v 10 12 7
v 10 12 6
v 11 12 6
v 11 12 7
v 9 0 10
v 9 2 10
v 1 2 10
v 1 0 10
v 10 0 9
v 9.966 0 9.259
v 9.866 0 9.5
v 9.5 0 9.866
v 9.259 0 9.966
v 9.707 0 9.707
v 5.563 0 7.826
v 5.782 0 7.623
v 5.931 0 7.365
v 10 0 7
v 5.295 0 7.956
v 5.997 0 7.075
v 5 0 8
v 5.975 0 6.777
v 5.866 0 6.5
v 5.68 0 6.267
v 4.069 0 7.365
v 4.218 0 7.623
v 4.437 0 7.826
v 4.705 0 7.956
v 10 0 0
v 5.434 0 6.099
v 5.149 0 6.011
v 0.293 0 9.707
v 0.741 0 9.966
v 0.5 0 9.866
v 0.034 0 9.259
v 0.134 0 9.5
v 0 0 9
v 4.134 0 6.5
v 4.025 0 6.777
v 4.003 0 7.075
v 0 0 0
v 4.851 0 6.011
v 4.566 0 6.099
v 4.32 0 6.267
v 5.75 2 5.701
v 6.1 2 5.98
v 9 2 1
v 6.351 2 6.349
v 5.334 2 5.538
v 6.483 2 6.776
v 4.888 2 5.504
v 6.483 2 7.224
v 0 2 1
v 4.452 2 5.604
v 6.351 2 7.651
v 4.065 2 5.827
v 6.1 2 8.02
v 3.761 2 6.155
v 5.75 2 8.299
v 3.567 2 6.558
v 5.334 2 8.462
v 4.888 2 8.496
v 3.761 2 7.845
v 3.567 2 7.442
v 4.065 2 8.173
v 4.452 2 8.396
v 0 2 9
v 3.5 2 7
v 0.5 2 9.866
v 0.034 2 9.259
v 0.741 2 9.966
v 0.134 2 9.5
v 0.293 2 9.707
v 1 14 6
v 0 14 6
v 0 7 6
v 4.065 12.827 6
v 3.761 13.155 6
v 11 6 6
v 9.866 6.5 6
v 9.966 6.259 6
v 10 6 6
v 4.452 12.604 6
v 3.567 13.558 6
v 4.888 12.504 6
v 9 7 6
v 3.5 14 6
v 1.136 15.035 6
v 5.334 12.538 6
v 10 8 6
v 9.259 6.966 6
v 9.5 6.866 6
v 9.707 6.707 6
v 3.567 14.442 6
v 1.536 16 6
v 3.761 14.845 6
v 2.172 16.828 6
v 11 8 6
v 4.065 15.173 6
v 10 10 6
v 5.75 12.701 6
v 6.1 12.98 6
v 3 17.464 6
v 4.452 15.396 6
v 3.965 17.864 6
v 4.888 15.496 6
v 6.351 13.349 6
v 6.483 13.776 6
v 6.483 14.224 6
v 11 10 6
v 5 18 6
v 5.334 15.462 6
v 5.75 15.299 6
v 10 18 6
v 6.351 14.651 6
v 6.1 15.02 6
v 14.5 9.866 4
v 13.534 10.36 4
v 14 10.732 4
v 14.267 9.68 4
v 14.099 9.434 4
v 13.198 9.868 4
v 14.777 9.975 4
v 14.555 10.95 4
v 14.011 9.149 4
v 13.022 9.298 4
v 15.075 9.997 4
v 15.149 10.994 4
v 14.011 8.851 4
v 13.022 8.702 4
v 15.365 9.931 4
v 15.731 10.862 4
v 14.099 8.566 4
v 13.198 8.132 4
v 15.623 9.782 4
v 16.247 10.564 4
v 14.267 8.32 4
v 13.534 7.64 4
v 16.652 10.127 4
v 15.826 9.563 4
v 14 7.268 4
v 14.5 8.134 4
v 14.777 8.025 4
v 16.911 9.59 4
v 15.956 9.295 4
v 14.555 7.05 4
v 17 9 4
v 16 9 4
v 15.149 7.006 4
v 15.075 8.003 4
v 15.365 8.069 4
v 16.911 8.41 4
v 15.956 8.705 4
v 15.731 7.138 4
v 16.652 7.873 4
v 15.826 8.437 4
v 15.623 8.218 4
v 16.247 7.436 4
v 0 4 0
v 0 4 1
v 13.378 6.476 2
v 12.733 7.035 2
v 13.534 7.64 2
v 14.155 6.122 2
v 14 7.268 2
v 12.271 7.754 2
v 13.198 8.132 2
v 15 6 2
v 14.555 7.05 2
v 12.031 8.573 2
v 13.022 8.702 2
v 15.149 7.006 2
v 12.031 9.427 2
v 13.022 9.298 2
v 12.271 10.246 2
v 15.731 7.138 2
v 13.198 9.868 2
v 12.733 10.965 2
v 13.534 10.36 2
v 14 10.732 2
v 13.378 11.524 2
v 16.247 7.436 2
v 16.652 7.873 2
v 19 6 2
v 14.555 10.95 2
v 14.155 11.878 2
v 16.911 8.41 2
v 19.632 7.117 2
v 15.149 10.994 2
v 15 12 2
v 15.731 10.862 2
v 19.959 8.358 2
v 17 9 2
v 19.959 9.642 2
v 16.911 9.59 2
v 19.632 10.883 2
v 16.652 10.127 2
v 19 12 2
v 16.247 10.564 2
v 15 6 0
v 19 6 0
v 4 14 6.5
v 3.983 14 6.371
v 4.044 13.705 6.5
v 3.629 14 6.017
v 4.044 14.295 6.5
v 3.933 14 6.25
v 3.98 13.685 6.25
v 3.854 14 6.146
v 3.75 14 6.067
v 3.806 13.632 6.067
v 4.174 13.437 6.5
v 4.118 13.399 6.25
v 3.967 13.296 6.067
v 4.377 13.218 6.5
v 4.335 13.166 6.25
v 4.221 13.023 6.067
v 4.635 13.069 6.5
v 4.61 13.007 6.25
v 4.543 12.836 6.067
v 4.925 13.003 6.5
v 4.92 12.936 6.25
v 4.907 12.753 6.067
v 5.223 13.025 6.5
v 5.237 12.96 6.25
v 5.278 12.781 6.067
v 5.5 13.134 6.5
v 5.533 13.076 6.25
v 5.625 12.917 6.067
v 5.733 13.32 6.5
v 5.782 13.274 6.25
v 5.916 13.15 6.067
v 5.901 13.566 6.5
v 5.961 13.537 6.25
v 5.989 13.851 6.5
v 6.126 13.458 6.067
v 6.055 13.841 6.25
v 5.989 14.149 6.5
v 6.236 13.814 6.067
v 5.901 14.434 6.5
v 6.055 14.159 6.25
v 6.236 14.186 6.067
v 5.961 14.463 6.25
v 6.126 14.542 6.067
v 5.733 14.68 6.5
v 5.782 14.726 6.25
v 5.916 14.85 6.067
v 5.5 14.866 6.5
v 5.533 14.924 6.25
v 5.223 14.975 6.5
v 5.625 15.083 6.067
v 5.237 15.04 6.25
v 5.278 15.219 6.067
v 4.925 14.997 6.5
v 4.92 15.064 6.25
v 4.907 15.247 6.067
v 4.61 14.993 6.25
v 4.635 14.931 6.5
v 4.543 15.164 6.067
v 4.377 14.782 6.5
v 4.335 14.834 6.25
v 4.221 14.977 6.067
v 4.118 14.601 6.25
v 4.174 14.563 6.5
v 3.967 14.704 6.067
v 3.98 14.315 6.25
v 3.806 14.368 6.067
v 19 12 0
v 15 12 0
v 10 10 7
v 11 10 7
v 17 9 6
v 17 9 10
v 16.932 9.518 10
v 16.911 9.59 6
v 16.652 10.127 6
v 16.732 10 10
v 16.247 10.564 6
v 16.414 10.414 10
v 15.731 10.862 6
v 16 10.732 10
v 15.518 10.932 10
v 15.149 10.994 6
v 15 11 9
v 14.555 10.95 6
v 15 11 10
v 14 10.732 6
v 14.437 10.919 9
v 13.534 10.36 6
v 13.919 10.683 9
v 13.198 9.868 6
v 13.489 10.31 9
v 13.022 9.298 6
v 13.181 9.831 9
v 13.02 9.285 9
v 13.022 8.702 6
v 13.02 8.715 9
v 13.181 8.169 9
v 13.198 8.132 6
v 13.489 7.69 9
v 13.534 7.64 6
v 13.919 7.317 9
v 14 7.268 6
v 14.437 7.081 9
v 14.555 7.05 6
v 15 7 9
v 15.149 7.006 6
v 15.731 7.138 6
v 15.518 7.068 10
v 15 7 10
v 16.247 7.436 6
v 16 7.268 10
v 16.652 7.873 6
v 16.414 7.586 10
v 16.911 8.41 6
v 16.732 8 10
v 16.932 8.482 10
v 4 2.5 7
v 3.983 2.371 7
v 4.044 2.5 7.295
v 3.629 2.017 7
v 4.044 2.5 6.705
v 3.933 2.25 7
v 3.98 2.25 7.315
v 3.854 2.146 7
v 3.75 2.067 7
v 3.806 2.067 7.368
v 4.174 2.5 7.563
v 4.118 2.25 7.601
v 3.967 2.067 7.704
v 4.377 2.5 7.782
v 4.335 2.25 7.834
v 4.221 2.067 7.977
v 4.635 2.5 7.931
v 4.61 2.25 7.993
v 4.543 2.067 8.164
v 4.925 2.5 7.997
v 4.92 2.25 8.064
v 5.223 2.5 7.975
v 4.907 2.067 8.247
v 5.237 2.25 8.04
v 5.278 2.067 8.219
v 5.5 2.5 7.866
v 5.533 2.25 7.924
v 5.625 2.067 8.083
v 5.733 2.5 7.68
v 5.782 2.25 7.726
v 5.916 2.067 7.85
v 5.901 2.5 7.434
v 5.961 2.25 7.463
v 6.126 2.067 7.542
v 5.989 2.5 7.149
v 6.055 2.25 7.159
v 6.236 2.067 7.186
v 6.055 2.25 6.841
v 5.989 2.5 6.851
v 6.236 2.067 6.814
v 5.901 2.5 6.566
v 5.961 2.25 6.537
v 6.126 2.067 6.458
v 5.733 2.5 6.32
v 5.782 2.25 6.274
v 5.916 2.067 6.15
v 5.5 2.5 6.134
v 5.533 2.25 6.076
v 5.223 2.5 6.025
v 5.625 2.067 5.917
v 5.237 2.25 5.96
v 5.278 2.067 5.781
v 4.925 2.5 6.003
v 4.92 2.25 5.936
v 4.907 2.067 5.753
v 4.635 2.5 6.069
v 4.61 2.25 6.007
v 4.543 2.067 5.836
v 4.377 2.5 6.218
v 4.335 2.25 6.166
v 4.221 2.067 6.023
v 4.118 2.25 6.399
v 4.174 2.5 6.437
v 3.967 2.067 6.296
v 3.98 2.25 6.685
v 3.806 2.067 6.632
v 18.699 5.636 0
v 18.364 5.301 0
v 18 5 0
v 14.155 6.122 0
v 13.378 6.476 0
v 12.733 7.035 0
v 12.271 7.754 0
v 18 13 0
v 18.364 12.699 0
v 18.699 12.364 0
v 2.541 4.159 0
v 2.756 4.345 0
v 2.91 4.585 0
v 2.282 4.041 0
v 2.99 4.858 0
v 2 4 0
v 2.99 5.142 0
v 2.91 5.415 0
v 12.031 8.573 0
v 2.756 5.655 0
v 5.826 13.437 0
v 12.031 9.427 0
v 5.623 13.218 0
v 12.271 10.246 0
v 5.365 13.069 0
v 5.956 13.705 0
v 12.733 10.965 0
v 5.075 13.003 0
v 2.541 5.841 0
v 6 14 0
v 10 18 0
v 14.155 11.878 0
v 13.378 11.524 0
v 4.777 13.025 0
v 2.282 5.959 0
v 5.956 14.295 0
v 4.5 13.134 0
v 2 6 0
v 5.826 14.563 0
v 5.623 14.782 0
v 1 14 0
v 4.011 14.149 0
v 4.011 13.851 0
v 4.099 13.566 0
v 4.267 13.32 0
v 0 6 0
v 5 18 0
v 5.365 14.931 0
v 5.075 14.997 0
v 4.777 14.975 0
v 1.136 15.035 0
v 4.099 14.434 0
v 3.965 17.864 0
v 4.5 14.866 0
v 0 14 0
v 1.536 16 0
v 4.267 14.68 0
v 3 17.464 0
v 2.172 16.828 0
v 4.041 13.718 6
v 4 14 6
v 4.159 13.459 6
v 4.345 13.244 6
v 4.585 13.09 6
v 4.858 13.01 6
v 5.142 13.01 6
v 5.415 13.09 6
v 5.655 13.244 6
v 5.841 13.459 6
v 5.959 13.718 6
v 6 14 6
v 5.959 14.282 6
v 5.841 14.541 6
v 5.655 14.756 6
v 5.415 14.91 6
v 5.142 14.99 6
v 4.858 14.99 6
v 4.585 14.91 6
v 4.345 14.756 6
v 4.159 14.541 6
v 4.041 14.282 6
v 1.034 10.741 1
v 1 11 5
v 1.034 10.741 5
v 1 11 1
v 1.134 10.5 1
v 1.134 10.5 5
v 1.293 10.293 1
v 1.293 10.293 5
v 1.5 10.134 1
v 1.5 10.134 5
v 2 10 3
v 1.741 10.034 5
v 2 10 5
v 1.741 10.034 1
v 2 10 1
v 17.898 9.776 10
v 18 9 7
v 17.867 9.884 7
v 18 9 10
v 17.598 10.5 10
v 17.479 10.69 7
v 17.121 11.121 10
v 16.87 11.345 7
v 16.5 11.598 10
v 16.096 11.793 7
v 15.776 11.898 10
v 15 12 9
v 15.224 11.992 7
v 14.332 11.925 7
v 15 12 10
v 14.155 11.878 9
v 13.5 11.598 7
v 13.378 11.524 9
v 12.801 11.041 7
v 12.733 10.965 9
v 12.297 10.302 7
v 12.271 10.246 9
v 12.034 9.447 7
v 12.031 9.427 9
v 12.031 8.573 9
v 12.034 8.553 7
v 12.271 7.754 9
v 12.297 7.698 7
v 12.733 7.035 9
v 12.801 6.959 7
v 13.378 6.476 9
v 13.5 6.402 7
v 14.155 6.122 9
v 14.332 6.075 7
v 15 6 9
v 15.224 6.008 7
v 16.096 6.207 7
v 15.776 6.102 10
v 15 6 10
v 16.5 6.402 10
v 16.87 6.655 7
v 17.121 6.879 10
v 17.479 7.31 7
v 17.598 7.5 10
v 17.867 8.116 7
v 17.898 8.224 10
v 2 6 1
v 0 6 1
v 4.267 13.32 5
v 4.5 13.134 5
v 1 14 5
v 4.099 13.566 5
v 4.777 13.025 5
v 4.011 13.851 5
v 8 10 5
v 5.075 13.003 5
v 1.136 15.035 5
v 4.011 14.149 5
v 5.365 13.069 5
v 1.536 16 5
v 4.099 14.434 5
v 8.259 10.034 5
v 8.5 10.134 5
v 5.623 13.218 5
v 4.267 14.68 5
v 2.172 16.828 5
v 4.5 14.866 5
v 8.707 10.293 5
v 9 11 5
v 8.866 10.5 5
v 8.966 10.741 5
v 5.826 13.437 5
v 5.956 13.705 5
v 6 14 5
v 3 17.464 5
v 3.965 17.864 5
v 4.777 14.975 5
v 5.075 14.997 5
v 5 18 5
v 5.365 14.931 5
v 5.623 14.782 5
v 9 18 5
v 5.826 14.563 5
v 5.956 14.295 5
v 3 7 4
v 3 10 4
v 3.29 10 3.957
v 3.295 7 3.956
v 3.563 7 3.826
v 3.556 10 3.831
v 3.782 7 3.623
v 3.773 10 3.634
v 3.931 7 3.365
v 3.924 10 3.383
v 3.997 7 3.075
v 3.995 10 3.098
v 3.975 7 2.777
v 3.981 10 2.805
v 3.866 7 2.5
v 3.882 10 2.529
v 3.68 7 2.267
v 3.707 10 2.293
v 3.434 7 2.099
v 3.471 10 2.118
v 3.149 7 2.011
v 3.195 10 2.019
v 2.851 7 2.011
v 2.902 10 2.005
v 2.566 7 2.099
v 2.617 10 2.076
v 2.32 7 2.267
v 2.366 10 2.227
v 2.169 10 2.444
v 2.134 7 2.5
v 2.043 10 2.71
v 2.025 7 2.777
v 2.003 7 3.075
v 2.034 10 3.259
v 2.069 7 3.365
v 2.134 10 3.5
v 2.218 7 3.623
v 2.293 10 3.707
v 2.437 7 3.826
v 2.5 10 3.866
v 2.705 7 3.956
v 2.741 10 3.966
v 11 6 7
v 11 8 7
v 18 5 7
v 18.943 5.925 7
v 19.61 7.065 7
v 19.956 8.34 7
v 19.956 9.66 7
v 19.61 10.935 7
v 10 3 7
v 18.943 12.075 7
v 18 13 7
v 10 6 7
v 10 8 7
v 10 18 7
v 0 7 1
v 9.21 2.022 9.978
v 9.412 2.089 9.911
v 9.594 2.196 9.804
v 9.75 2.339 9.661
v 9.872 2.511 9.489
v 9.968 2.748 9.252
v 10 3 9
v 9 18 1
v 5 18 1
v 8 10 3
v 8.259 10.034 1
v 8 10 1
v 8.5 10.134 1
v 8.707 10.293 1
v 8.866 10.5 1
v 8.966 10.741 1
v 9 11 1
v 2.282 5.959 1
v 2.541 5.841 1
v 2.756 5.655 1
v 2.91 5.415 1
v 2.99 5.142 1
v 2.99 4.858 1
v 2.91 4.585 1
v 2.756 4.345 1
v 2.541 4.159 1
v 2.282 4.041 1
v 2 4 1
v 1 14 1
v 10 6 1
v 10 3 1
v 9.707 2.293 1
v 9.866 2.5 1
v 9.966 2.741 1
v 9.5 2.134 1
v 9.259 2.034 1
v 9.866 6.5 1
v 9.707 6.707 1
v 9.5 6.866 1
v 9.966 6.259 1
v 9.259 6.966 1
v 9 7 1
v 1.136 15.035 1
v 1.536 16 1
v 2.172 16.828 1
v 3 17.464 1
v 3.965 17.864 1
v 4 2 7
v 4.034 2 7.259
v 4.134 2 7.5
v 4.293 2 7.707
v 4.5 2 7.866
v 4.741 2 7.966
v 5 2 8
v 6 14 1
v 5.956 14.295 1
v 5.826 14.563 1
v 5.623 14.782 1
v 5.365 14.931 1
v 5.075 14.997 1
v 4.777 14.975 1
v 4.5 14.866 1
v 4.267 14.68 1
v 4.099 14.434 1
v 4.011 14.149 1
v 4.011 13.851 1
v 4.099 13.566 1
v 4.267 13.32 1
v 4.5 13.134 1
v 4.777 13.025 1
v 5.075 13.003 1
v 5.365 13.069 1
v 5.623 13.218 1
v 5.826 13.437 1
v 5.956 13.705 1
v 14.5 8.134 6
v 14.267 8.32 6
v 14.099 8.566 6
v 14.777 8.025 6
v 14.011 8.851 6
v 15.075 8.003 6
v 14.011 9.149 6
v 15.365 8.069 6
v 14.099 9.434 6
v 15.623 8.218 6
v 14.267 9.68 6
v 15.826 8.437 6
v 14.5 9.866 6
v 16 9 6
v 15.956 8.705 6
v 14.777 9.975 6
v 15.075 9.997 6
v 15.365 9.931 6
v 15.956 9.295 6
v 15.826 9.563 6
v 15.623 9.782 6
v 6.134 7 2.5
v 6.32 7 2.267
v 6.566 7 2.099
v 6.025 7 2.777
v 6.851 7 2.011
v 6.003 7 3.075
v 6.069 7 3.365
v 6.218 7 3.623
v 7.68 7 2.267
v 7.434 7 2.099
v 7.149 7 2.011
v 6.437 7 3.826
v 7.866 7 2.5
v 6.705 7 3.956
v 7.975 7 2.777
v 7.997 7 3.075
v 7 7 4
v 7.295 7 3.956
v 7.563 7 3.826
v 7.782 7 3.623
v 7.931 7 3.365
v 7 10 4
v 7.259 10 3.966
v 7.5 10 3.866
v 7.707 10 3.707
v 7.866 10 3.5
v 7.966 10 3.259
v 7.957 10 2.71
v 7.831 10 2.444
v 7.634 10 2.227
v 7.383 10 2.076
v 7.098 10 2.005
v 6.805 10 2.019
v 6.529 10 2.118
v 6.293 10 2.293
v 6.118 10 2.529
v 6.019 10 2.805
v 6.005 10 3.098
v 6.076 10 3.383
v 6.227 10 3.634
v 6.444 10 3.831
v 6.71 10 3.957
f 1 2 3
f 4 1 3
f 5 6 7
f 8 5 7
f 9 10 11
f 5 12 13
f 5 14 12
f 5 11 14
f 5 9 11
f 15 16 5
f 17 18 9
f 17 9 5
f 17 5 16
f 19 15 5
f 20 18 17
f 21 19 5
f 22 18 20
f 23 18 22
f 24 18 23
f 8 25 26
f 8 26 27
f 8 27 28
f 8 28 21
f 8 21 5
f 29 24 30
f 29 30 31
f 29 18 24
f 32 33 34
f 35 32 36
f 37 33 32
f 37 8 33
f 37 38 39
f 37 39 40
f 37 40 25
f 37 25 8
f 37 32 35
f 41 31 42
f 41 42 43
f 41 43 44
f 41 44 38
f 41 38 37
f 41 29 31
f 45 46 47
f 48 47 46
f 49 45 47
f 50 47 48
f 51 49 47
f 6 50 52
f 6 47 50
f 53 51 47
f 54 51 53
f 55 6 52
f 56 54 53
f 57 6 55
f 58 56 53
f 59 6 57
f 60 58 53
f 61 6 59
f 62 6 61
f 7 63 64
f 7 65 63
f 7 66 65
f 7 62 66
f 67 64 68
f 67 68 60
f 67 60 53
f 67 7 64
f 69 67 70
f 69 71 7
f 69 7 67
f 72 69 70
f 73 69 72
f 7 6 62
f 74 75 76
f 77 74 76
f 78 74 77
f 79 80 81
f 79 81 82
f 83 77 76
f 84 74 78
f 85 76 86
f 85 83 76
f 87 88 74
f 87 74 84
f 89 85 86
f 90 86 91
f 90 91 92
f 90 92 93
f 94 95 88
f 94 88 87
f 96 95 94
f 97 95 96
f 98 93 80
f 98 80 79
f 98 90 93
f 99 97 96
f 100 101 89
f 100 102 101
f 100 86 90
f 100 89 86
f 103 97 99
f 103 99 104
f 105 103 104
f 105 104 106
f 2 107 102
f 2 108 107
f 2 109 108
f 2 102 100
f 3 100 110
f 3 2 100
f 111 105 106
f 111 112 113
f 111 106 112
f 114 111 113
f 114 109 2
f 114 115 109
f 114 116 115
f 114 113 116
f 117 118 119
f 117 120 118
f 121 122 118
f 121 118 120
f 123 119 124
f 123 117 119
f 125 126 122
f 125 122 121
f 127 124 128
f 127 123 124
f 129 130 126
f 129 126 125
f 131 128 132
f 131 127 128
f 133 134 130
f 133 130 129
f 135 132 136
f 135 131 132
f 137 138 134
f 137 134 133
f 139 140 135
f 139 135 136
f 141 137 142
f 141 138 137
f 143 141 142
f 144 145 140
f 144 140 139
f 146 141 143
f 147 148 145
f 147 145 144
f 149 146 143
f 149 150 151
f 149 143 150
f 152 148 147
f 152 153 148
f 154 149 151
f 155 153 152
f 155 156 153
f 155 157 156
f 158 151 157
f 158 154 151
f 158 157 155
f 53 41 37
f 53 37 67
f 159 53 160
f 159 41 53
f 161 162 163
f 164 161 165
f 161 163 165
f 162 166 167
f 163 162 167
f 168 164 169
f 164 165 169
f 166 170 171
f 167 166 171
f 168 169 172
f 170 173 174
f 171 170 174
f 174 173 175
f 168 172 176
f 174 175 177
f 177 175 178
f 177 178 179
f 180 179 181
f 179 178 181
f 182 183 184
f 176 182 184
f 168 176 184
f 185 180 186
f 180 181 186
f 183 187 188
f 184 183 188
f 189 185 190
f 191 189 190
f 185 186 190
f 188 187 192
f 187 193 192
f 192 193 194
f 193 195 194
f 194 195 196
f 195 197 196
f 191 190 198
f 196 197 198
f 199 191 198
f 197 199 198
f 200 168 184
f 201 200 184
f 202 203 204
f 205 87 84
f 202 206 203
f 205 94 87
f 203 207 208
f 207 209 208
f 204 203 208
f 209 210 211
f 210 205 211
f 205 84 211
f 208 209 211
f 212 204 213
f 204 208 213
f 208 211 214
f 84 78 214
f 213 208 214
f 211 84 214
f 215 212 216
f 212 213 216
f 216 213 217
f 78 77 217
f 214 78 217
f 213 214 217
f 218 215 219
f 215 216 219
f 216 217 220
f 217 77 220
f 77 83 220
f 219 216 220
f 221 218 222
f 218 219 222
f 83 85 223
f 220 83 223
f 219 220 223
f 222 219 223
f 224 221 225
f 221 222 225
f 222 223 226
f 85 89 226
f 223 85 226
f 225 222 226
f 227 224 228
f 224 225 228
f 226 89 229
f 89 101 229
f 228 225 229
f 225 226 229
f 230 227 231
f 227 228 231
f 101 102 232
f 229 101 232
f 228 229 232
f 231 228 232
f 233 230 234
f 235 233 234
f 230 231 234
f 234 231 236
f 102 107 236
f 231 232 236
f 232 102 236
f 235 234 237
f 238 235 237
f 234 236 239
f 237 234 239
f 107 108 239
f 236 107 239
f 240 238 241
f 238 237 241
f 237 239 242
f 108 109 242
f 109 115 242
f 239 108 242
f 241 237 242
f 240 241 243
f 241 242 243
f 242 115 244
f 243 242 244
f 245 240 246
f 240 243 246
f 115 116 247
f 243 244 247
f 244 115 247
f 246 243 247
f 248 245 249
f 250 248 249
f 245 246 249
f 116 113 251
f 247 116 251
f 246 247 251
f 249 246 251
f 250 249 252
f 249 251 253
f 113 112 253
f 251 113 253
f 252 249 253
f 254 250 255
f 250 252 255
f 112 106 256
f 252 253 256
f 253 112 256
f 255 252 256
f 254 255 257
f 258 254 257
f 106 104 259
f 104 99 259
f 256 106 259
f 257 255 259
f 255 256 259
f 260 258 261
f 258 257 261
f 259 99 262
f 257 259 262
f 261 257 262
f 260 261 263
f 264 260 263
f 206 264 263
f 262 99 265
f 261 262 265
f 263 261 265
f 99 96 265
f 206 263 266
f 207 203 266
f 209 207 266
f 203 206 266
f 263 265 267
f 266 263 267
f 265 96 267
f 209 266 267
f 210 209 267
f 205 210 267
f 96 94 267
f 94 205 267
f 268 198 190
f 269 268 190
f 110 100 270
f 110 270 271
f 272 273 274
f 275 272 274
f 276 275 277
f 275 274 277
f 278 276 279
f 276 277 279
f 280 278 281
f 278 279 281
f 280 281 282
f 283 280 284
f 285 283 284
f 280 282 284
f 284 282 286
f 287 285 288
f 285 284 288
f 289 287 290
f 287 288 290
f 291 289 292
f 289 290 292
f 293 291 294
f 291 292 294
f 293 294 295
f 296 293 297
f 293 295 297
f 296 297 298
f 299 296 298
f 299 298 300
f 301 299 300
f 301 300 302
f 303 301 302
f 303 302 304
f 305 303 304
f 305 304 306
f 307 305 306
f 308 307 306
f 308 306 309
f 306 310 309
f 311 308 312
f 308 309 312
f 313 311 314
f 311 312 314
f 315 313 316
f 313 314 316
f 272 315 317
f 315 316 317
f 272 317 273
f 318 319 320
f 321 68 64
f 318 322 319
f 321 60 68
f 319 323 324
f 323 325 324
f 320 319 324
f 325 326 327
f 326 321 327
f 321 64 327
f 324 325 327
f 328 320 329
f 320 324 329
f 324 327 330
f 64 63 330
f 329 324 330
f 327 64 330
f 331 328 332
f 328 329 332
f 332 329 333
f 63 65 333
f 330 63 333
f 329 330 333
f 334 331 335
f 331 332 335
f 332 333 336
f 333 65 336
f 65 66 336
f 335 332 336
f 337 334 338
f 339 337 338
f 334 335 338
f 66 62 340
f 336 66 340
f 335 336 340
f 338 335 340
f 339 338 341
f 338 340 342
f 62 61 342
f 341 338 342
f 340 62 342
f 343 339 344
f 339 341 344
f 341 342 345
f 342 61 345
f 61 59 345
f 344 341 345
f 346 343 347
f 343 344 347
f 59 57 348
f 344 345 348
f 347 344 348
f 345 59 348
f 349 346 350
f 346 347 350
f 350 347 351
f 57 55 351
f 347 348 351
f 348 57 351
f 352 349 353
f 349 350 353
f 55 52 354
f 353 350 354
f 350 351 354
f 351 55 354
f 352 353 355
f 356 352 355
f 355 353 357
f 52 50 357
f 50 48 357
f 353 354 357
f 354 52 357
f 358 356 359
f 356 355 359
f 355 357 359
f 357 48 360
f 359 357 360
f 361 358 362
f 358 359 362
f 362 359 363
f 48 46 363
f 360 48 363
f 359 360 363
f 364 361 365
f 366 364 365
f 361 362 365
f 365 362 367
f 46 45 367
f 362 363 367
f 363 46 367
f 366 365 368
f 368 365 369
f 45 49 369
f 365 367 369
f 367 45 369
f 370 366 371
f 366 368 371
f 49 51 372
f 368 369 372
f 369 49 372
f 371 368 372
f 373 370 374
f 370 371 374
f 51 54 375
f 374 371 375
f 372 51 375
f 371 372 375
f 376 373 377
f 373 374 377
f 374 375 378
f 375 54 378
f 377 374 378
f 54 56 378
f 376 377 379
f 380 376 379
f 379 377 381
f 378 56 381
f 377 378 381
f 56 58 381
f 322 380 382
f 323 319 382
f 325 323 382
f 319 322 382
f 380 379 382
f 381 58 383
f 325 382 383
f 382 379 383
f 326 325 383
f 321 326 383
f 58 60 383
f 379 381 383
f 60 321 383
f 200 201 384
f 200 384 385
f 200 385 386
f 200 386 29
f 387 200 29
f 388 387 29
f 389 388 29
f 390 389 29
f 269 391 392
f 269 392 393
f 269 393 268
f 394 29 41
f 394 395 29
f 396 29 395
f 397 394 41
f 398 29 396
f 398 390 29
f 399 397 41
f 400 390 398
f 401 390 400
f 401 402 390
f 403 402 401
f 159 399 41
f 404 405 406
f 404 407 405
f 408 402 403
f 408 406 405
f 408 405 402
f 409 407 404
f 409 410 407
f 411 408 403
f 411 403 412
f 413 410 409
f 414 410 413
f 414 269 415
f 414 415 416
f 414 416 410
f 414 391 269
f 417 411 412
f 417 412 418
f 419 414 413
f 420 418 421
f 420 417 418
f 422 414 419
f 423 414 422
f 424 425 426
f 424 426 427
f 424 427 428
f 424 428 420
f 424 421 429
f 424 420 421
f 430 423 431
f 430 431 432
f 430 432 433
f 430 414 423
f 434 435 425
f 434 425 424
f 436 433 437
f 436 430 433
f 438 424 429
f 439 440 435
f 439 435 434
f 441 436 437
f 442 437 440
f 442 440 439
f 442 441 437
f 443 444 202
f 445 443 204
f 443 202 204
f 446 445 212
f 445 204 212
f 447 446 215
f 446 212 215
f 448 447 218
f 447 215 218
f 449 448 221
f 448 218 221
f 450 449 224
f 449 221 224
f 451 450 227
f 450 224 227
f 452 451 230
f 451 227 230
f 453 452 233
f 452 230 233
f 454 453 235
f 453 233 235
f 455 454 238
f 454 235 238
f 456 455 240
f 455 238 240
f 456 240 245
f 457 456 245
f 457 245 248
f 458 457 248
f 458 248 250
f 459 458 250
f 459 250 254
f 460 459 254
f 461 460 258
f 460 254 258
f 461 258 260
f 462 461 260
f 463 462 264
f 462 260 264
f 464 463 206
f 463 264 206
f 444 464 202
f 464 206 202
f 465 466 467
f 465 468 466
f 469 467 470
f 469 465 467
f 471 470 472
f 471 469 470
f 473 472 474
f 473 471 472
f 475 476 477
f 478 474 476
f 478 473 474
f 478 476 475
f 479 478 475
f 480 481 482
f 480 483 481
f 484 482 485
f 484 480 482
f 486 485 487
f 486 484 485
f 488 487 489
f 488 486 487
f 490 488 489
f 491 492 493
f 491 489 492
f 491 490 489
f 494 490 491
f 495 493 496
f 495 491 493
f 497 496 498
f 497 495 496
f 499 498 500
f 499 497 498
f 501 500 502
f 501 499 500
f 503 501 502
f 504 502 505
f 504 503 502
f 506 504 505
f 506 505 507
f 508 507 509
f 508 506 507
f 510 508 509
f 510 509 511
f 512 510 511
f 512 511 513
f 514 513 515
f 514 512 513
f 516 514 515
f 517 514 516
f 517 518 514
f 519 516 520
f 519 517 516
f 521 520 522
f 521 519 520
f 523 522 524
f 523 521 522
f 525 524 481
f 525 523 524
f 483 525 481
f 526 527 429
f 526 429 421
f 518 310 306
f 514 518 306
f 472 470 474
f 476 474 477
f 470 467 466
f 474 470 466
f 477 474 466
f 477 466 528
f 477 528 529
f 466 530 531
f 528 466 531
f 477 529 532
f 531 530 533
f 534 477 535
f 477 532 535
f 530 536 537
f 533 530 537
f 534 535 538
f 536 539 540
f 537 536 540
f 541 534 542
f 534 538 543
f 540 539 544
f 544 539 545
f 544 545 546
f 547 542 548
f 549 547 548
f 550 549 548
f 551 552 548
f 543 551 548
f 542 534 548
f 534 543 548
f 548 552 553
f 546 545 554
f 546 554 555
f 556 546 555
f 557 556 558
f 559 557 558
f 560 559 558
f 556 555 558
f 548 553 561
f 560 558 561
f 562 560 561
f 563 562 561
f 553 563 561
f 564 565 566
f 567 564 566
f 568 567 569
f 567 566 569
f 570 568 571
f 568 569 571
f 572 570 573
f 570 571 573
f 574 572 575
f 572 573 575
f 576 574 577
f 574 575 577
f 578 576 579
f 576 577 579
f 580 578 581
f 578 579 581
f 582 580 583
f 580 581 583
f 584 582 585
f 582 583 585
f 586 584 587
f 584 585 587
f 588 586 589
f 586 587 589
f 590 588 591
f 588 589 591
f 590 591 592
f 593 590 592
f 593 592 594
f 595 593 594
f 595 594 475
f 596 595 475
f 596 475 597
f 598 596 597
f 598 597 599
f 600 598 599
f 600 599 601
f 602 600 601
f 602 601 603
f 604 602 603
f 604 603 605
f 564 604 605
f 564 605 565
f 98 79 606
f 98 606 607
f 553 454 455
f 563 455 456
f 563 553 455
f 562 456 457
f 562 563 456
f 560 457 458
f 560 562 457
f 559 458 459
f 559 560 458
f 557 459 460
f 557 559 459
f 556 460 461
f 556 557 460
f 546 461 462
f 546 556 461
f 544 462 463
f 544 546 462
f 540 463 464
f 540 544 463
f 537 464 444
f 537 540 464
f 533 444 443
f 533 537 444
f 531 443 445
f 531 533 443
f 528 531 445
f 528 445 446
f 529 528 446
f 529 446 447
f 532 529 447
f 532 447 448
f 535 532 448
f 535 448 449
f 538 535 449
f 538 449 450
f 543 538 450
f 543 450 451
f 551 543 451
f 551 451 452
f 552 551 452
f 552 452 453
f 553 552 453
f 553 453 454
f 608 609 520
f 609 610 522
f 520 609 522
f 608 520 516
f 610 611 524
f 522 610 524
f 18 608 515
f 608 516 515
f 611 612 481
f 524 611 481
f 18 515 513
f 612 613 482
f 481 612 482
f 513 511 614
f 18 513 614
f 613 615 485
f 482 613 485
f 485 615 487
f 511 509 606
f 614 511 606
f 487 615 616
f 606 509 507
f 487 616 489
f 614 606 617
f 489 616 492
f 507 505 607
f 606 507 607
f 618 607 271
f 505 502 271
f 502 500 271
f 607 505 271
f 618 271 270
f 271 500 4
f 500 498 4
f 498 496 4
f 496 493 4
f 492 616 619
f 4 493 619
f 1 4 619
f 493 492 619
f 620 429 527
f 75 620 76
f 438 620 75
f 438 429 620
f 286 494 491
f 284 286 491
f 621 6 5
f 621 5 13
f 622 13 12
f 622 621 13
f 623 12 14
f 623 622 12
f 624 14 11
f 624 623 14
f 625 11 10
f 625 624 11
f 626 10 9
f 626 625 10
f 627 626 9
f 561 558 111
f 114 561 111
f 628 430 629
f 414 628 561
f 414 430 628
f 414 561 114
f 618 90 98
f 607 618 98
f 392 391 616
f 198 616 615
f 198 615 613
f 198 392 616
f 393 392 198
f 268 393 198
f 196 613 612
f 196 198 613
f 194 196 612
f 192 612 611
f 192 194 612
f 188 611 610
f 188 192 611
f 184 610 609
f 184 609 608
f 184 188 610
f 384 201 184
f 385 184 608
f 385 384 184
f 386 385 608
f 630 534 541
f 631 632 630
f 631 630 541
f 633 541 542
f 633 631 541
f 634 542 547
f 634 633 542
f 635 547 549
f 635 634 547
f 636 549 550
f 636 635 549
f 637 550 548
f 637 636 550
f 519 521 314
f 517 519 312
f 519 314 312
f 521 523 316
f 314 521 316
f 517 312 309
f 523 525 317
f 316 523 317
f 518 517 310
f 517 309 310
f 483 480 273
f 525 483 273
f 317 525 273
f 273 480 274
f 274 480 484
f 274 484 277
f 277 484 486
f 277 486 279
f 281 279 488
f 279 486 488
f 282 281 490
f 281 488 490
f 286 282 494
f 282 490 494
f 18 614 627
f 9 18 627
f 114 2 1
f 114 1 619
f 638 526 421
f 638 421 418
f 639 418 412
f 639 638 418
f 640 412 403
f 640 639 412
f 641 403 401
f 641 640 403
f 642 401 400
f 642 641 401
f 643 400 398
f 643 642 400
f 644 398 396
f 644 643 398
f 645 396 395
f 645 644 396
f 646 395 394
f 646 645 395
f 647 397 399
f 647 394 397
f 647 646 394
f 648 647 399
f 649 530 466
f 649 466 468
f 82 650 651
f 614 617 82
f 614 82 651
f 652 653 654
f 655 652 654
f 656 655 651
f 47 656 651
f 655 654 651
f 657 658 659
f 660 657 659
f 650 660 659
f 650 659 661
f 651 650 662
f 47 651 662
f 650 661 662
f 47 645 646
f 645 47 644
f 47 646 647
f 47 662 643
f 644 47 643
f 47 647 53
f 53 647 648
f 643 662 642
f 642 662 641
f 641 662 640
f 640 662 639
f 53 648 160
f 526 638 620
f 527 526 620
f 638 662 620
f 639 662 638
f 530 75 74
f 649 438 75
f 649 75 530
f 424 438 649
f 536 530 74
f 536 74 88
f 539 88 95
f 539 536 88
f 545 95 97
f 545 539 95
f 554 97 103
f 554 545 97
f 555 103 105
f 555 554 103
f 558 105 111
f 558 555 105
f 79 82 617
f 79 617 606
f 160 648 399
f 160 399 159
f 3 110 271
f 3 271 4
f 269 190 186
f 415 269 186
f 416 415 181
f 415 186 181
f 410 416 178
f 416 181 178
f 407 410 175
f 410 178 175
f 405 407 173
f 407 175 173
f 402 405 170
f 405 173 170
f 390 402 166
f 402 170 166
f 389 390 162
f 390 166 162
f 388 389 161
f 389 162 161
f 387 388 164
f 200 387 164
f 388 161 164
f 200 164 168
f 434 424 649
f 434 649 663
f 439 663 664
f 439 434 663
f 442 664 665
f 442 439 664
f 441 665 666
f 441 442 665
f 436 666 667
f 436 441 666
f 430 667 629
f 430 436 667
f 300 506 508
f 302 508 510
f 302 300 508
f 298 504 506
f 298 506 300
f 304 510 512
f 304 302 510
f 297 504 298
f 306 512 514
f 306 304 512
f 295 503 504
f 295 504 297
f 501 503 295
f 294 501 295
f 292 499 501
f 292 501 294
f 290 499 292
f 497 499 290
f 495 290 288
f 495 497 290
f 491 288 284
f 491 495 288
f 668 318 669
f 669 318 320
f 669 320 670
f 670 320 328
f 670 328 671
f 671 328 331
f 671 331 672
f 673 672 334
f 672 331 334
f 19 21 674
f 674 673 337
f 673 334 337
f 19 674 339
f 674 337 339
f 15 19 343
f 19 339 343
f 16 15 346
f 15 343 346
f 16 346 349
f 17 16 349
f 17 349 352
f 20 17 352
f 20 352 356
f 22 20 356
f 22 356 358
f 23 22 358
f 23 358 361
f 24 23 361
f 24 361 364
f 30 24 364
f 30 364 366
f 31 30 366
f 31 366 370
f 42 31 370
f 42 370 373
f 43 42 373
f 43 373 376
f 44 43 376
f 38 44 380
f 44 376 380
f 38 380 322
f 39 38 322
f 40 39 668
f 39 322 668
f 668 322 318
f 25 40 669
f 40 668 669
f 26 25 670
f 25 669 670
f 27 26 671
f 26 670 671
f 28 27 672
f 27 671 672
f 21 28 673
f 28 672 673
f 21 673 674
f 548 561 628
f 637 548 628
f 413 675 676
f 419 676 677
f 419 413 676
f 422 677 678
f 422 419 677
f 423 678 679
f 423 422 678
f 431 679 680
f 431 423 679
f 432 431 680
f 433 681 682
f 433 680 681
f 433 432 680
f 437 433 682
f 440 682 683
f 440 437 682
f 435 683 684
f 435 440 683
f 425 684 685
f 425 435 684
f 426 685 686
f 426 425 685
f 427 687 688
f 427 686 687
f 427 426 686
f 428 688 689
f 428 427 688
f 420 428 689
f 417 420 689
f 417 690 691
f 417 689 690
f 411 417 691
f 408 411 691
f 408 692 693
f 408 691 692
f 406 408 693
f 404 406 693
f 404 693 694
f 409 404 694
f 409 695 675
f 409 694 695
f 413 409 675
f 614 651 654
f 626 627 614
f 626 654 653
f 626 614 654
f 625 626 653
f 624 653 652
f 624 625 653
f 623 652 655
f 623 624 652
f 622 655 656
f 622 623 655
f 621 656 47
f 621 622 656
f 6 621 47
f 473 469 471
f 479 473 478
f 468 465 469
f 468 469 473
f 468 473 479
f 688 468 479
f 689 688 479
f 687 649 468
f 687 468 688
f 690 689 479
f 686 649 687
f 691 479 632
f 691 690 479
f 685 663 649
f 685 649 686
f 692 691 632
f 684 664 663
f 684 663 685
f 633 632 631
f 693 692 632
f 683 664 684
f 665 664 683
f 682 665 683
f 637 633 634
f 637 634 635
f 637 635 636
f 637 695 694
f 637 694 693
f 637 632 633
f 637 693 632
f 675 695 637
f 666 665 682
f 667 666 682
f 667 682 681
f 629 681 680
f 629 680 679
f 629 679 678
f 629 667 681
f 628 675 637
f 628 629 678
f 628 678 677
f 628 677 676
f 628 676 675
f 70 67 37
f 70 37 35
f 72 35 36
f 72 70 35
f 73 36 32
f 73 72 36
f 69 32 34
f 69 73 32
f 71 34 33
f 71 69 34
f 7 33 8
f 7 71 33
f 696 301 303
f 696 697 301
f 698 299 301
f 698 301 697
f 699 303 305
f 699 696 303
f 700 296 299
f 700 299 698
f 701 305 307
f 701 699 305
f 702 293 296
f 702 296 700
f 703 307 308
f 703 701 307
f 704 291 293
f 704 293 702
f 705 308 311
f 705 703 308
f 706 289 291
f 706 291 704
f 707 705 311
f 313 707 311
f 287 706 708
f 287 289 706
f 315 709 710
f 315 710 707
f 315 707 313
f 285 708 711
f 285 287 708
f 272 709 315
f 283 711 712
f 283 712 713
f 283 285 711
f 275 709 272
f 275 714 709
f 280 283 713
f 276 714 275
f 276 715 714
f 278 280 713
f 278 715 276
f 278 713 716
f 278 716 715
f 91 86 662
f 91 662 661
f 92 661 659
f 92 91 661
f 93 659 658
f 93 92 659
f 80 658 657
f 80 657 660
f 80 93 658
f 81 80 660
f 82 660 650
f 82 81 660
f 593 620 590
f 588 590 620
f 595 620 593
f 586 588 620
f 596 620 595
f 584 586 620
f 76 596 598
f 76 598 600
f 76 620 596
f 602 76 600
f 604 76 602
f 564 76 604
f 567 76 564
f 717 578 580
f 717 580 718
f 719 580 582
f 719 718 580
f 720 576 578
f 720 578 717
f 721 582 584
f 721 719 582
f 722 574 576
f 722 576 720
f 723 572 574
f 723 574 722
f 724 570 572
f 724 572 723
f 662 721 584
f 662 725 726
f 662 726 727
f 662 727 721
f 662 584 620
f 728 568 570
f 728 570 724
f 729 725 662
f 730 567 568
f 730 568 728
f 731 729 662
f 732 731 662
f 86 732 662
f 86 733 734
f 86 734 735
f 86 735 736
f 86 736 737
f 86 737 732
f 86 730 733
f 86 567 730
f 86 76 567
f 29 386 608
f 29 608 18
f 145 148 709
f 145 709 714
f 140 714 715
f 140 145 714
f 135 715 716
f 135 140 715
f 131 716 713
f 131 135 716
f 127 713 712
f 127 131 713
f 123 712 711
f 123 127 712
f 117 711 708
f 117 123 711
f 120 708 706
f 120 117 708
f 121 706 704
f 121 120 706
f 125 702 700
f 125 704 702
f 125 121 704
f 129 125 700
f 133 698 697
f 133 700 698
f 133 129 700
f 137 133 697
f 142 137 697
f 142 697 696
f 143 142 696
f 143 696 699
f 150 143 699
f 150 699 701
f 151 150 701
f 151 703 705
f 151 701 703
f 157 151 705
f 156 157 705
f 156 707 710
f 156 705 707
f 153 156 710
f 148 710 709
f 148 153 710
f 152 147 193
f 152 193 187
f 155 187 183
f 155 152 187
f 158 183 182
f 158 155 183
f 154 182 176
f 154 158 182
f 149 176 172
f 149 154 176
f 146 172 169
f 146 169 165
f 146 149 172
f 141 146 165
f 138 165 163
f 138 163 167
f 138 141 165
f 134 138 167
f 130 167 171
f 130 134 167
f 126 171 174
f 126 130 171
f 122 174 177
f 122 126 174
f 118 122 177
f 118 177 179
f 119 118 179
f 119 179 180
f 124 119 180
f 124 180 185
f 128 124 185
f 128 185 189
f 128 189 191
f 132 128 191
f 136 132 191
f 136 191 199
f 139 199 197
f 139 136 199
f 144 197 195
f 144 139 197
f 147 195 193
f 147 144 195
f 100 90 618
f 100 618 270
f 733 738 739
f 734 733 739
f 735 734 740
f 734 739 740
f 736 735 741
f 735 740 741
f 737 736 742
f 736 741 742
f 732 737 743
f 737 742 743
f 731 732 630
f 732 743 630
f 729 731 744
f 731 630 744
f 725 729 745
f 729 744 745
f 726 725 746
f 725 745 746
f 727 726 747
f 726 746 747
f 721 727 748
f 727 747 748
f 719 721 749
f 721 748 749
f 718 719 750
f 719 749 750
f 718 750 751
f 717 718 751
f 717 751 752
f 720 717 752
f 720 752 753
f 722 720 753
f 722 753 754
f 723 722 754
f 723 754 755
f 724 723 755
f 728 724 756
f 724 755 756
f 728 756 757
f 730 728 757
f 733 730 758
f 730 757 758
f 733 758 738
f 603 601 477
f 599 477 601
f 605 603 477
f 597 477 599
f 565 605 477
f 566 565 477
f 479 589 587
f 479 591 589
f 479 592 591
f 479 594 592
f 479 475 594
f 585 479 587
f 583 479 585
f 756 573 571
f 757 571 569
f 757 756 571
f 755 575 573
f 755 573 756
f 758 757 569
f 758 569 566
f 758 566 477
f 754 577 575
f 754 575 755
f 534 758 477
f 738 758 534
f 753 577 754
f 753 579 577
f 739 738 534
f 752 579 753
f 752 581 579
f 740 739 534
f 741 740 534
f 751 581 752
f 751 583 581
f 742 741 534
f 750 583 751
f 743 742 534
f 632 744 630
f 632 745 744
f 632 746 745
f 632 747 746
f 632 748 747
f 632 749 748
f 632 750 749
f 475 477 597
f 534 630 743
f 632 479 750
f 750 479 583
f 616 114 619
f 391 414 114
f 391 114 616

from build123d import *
from build123d.topology import SkipClean

# Parameters (mm, degrees)
SKETCH1_R           = 1
BOSS_EXTRUDE1_DEPTH = 10
SKETCH2_W           = 1
SKETCH2_H           = 2
SKETCH2_W_2         = 2
SKETCH2_H_2         = 3
CUT_EXTRUDE1_DEPTH  = 20
SKETCH3_W           = 11.356791525
SKETCH3_H           = 18.189557321
SKETCH3_R           = 3
CUT_EXTRUDE2_DEPTH  = 3
SKETCH4_R           = 2
CUT_EXTRUDE3_DEPTH  = 4
CUT_EXTRUDE4_START  = -2
CUT_EXTRUDE4_DEPTH  = 2
CUT_EXTRUDE5_START  = -2
SKETCH6_R           = 2
CUT_EXTRUDE5_DEPTH  = 2
SKETCH7_W           = 8
SKETCH7_H           = 4
CUT_EXTRUDE6_DEPTH  = 8
FILLET1_R           = 1
SKETCH9_R           = 1
CUT_EXTRUDE8_DEPTH  = 3
CUT_EXTRUDE9_DEPTH  = 9
CUT_EXTRUDE10_START = -4
SKETCH11_R          = 1
CUT_EXTRUDE10_DEPTH = 4
CUT_EXTRUDE11_DEPTH = 4
CUT_EXTRUDE12_DEPTH = 27
SKETCH14_R          = 1
CUT_EXTRUDE13_DEPTH = 27


with BuildPart() as part:
    # Sketch1 → Boss-Extrude1 (new body)
    with BuildSketch(Plane.XY):
        with BuildLine():
            Line((0, 0), (0, 14))
            Line((0, 14), (1, 14))
            ThreePointArc((1, 14), (2.171572875, 16.828427125), (5, 18))
            Line((5, 18), (10, 18))
            Line((10, 18), (18, 13))
            ThreePointArc((18, 13), (20, 9), (18, 5))
            Line((18, 5), (10, 0))
            Line((10, 0), (0, 0))
        make_face()
        with Locations((5, 14)):
            Circle(SKETCH1_R, mode=Mode.SUBTRACT)
        with Locations((15, 9)):
            Circle(SKETCH1_R, mode=Mode.SUBTRACT)
    extrude(amount=BOSS_EXTRUDE1_DEPTH)

    # Sketch2 → Cut-Extrude1 (cut)
    with BuildSketch(Plane(origin=(0, 18, 0), x_dir=(1, 0, 0), z_dir=(0, 1, 0))):
        with Locations((19.5, -1)):
            Rectangle(SKETCH2_W, SKETCH2_H)
        with Locations((19, -8.5)):
            Rectangle(SKETCH2_W_2, SKETCH2_H_2)
        Polygon((10, -7), (10, -10), (15, -10), (15, -9), (12, -9), (12, -7), align=None)
    extrude(amount=-CUT_EXTRUDE1_DEPTH, mode=Mode.SUBTRACT)

    # Sketch3 → Cut-Extrude2 (cut)
    with BuildSketch(Plane.XY.offset(10)):
        with Locations((15.678395763, 9.094778661)):
            Rectangle(SKETCH3_W, SKETCH3_H)
        with Locations((15, 9)):
            Circle(SKETCH3_R, mode=Mode.SUBTRACT)
    extrude(amount=-CUT_EXTRUDE2_DEPTH, mode=Mode.SUBTRACT)

    # Sketch4 → Cut-Extrude3 (cut)
    with BuildSketch(Plane.XY.offset(10)):
        with Locations((15, 9)):
            Circle(SKETCH4_R)
    extrude(amount=-CUT_EXTRUDE3_DEPTH, mode=Mode.SUBTRACT)

    # Sketch5 → Cut-Extrude4 (cut)
    with BuildSketch(Plane(origin=(0, 0, 0), x_dir=(-1, 0, 0), z_dir=(0, 0, -1)).offset(CUT_EXTRUDE4_START)):
        with BuildLine():
            Line((-15, 6), (-23.076049943, 6))
            ThreePointArc((-23.076049943, 6), (-26.076049943, 9), (-23.076049943, 12))
            Line((-23.076049943, 12), (-15, 12))
            ThreePointArc((-15, 12), (-12, 9), (-15, 6))
        make_face()
    extrude(amount=CUT_EXTRUDE4_DEPTH, mode=Mode.SUBTRACT)

    # Sketch6 → Cut-Extrude5 (cut)
    with BuildSketch(Plane(origin=(0, 0, 2), x_dir=(-1, 0, 0), z_dir=(0, 0, -1)).offset(CUT_EXTRUDE5_START)):
        with Locations((-15, 9)):
            Circle(SKETCH6_R)
    extrude(amount=CUT_EXTRUDE5_DEPTH, mode=Mode.SUBTRACT)

    # Sketch7 → Cut-Extrude6 (cut)
    with BuildSketch(Plane(origin=(0, 18, 0), x_dir=(1, 0, 0), z_dir=(0, 1, 0))):
        with Locations((5, -3)):
            Rectangle(SKETCH7_W, SKETCH7_H)
    extrude(amount=-CUT_EXTRUDE6_DEPTH, mode=Mode.SUBTRACT)

    # Fillet1
    fillet1_edges = [part.edges().sort_by_distance(p)[0] for p in [
        (1, 10, 3),
        (9, 10, 3),
    ]]
    fillet(fillet1_edges, radius=FILLET1_R)

    # Sketch9 → Cut-Extrude8 (cut)
    with BuildSketch(Plane(origin=(0, 10, 0), x_dir=(1, 0, 0), z_dir=(0, 1, 0))):
        with Locations((7, -3)):
            Circle(SKETCH9_R)
        with Locations((3, -3)):
            Circle(SKETCH9_R)
    extrude(amount=-CUT_EXTRUDE8_DEPTH, mode=Mode.SUBTRACT)

    # Sketch10 → Cut-Extrude9 (cut)
    with BuildSketch(Plane.XY.offset(10)):
        with BuildLine():
            Line((0, 7), (9, 7))
            ThreePointArc((9, 7), (9.707106781, 6.707106781), (10, 6))
            Line((10, 6), (10, 3))
            ThreePointArc((10, 3), (9.707106781, 2.292893219), (9, 2))
            Line((9, 2), (0, 2))
            Line((0, 2), (0, 7))
        make_face()
    extrude(amount=-CUT_EXTRUDE9_DEPTH, mode=Mode.SUBTRACT)

    # Sketch11 → Cut-Extrude10 (cut)
    with BuildSketch(Plane.XY.offset(10).offset(CUT_EXTRUDE10_START)):
        with BuildLine():
            Line((10, 8), (10, 10))
            Line((10, 10), (11, 10))
            Line((11, 10), (11, 12))
            Line((11, 12), (10, 12))
            Line((10, 12), (10, 18))
            Line((10, 18), (5, 18))
            ThreePointArc((5, 18), (2.171572875, 16.828427125), (1, 14))
            Line((1, 14), (0, 14))
            Line((0, 14), (0, 7))
            Line((0, 7), (9, 7))
            ThreePointArc((9, 7), (9.707106781, 6.707106781), (10, 6))
            Line((10, 6), (11, 6))
            Line((11, 6), (11, 8))
            Line((11, 8), (10, 8))
        make_face()
        with Locations((5, 14)):
            Circle(SKETCH11_R, mode=Mode.SUBTRACT)
    extrude(amount=CUT_EXTRUDE10_DEPTH, mode=Mode.SUBTRACT)

    # Sketch12 → Cut-Extrude11 (cut)
    with BuildSketch(Plane.XY.offset(1)):
        with BuildLine():
            Line((2, 4), (-2.189178963, 4))
            ThreePointArc((-2.189178963, 4), (-3.189178963, 5), (-2.189178963, 6))
            Line((-2.189178963, 6), (2, 6))
            ThreePointArc((2, 6), (3, 5), (2, 4))
        make_face()
    extrude(amount=-CUT_EXTRUDE11_DEPTH, mode=Mode.SUBTRACT)

    # Sketch13 → Cut-Extrude12 (cut)
    with BuildSketch(Plane(origin=(0, 18, 0), x_dir=(1, 0, 0), z_dir=(0, 1, 0))):
        with BuildLine():
            Line((10, -9), (10, -10))
            Line((10, -10), (9, -10))
            ThreePointArc((9, -10), (9.707106781, -9.707106781), (10, -9))
        make_face()
        with BuildLine():
            Line((1, -10), (0, -10))
            Line((0, -10), (0, -9))
            ThreePointArc((0, -9), (0.292893219, -9.707106781), (1, -10))
        make_face()
    extrude(amount=-CUT_EXTRUDE12_DEPTH, mode=Mode.SUBTRACT)

    # Sketch14 → Cut-Extrude13 (cut)
    with BuildSketch(Plane(origin=(0, 2, 0), x_dir=(1, 0, 0), z_dir=(0, 1, 0))):
        with Locations((5, -7)):
            Circle(SKETCH14_R)
    extrude(amount=-CUT_EXTRUDE13_DEPTH, mode=Mode.SUBTRACT)

    # Sketch15 → Revolve1 (revolve)
    with SkipClean():  # the faces are left unmerged after this step: merging them gives an invalid solid
        with BuildSketch(Plane.XY.offset(7)):
            with BuildLine():
                Line((4, 2), (4, 2.5))
                ThreePointArc((4, 2.5), (3.853553391, 2.146446609), (3.5, 2))
                Line((3.5, 2), (4, 2))
            make_face()
        revolve(axis=Axis((5, 0, 7), (0, 1, 0)))

    # Sketch16 → Revolve2 (revolve)
    with SkipClean():  # the faces are left unmerged after this step: merging them gives an invalid solid
        with BuildSketch(Plane(origin=(0, 14, 0), x_dir=(1, 0, 0), z_dir=(0, 1, 0))):
            with BuildLine():
                Line((4, -6), (4, -6.5))
                ThreePointArc((4, -6.5), (3.853553391, -6.146446609), (3.5, -6))
                Line((3.5, -6), (4, -6))
            make_face()
        revolve(axis=Axis((5, 14, 5), (0, 0, 1)))
    add(part.part.scale(1), mode=Mode.REPLACE)  # the faces are merged on a copy


solid = part.part
